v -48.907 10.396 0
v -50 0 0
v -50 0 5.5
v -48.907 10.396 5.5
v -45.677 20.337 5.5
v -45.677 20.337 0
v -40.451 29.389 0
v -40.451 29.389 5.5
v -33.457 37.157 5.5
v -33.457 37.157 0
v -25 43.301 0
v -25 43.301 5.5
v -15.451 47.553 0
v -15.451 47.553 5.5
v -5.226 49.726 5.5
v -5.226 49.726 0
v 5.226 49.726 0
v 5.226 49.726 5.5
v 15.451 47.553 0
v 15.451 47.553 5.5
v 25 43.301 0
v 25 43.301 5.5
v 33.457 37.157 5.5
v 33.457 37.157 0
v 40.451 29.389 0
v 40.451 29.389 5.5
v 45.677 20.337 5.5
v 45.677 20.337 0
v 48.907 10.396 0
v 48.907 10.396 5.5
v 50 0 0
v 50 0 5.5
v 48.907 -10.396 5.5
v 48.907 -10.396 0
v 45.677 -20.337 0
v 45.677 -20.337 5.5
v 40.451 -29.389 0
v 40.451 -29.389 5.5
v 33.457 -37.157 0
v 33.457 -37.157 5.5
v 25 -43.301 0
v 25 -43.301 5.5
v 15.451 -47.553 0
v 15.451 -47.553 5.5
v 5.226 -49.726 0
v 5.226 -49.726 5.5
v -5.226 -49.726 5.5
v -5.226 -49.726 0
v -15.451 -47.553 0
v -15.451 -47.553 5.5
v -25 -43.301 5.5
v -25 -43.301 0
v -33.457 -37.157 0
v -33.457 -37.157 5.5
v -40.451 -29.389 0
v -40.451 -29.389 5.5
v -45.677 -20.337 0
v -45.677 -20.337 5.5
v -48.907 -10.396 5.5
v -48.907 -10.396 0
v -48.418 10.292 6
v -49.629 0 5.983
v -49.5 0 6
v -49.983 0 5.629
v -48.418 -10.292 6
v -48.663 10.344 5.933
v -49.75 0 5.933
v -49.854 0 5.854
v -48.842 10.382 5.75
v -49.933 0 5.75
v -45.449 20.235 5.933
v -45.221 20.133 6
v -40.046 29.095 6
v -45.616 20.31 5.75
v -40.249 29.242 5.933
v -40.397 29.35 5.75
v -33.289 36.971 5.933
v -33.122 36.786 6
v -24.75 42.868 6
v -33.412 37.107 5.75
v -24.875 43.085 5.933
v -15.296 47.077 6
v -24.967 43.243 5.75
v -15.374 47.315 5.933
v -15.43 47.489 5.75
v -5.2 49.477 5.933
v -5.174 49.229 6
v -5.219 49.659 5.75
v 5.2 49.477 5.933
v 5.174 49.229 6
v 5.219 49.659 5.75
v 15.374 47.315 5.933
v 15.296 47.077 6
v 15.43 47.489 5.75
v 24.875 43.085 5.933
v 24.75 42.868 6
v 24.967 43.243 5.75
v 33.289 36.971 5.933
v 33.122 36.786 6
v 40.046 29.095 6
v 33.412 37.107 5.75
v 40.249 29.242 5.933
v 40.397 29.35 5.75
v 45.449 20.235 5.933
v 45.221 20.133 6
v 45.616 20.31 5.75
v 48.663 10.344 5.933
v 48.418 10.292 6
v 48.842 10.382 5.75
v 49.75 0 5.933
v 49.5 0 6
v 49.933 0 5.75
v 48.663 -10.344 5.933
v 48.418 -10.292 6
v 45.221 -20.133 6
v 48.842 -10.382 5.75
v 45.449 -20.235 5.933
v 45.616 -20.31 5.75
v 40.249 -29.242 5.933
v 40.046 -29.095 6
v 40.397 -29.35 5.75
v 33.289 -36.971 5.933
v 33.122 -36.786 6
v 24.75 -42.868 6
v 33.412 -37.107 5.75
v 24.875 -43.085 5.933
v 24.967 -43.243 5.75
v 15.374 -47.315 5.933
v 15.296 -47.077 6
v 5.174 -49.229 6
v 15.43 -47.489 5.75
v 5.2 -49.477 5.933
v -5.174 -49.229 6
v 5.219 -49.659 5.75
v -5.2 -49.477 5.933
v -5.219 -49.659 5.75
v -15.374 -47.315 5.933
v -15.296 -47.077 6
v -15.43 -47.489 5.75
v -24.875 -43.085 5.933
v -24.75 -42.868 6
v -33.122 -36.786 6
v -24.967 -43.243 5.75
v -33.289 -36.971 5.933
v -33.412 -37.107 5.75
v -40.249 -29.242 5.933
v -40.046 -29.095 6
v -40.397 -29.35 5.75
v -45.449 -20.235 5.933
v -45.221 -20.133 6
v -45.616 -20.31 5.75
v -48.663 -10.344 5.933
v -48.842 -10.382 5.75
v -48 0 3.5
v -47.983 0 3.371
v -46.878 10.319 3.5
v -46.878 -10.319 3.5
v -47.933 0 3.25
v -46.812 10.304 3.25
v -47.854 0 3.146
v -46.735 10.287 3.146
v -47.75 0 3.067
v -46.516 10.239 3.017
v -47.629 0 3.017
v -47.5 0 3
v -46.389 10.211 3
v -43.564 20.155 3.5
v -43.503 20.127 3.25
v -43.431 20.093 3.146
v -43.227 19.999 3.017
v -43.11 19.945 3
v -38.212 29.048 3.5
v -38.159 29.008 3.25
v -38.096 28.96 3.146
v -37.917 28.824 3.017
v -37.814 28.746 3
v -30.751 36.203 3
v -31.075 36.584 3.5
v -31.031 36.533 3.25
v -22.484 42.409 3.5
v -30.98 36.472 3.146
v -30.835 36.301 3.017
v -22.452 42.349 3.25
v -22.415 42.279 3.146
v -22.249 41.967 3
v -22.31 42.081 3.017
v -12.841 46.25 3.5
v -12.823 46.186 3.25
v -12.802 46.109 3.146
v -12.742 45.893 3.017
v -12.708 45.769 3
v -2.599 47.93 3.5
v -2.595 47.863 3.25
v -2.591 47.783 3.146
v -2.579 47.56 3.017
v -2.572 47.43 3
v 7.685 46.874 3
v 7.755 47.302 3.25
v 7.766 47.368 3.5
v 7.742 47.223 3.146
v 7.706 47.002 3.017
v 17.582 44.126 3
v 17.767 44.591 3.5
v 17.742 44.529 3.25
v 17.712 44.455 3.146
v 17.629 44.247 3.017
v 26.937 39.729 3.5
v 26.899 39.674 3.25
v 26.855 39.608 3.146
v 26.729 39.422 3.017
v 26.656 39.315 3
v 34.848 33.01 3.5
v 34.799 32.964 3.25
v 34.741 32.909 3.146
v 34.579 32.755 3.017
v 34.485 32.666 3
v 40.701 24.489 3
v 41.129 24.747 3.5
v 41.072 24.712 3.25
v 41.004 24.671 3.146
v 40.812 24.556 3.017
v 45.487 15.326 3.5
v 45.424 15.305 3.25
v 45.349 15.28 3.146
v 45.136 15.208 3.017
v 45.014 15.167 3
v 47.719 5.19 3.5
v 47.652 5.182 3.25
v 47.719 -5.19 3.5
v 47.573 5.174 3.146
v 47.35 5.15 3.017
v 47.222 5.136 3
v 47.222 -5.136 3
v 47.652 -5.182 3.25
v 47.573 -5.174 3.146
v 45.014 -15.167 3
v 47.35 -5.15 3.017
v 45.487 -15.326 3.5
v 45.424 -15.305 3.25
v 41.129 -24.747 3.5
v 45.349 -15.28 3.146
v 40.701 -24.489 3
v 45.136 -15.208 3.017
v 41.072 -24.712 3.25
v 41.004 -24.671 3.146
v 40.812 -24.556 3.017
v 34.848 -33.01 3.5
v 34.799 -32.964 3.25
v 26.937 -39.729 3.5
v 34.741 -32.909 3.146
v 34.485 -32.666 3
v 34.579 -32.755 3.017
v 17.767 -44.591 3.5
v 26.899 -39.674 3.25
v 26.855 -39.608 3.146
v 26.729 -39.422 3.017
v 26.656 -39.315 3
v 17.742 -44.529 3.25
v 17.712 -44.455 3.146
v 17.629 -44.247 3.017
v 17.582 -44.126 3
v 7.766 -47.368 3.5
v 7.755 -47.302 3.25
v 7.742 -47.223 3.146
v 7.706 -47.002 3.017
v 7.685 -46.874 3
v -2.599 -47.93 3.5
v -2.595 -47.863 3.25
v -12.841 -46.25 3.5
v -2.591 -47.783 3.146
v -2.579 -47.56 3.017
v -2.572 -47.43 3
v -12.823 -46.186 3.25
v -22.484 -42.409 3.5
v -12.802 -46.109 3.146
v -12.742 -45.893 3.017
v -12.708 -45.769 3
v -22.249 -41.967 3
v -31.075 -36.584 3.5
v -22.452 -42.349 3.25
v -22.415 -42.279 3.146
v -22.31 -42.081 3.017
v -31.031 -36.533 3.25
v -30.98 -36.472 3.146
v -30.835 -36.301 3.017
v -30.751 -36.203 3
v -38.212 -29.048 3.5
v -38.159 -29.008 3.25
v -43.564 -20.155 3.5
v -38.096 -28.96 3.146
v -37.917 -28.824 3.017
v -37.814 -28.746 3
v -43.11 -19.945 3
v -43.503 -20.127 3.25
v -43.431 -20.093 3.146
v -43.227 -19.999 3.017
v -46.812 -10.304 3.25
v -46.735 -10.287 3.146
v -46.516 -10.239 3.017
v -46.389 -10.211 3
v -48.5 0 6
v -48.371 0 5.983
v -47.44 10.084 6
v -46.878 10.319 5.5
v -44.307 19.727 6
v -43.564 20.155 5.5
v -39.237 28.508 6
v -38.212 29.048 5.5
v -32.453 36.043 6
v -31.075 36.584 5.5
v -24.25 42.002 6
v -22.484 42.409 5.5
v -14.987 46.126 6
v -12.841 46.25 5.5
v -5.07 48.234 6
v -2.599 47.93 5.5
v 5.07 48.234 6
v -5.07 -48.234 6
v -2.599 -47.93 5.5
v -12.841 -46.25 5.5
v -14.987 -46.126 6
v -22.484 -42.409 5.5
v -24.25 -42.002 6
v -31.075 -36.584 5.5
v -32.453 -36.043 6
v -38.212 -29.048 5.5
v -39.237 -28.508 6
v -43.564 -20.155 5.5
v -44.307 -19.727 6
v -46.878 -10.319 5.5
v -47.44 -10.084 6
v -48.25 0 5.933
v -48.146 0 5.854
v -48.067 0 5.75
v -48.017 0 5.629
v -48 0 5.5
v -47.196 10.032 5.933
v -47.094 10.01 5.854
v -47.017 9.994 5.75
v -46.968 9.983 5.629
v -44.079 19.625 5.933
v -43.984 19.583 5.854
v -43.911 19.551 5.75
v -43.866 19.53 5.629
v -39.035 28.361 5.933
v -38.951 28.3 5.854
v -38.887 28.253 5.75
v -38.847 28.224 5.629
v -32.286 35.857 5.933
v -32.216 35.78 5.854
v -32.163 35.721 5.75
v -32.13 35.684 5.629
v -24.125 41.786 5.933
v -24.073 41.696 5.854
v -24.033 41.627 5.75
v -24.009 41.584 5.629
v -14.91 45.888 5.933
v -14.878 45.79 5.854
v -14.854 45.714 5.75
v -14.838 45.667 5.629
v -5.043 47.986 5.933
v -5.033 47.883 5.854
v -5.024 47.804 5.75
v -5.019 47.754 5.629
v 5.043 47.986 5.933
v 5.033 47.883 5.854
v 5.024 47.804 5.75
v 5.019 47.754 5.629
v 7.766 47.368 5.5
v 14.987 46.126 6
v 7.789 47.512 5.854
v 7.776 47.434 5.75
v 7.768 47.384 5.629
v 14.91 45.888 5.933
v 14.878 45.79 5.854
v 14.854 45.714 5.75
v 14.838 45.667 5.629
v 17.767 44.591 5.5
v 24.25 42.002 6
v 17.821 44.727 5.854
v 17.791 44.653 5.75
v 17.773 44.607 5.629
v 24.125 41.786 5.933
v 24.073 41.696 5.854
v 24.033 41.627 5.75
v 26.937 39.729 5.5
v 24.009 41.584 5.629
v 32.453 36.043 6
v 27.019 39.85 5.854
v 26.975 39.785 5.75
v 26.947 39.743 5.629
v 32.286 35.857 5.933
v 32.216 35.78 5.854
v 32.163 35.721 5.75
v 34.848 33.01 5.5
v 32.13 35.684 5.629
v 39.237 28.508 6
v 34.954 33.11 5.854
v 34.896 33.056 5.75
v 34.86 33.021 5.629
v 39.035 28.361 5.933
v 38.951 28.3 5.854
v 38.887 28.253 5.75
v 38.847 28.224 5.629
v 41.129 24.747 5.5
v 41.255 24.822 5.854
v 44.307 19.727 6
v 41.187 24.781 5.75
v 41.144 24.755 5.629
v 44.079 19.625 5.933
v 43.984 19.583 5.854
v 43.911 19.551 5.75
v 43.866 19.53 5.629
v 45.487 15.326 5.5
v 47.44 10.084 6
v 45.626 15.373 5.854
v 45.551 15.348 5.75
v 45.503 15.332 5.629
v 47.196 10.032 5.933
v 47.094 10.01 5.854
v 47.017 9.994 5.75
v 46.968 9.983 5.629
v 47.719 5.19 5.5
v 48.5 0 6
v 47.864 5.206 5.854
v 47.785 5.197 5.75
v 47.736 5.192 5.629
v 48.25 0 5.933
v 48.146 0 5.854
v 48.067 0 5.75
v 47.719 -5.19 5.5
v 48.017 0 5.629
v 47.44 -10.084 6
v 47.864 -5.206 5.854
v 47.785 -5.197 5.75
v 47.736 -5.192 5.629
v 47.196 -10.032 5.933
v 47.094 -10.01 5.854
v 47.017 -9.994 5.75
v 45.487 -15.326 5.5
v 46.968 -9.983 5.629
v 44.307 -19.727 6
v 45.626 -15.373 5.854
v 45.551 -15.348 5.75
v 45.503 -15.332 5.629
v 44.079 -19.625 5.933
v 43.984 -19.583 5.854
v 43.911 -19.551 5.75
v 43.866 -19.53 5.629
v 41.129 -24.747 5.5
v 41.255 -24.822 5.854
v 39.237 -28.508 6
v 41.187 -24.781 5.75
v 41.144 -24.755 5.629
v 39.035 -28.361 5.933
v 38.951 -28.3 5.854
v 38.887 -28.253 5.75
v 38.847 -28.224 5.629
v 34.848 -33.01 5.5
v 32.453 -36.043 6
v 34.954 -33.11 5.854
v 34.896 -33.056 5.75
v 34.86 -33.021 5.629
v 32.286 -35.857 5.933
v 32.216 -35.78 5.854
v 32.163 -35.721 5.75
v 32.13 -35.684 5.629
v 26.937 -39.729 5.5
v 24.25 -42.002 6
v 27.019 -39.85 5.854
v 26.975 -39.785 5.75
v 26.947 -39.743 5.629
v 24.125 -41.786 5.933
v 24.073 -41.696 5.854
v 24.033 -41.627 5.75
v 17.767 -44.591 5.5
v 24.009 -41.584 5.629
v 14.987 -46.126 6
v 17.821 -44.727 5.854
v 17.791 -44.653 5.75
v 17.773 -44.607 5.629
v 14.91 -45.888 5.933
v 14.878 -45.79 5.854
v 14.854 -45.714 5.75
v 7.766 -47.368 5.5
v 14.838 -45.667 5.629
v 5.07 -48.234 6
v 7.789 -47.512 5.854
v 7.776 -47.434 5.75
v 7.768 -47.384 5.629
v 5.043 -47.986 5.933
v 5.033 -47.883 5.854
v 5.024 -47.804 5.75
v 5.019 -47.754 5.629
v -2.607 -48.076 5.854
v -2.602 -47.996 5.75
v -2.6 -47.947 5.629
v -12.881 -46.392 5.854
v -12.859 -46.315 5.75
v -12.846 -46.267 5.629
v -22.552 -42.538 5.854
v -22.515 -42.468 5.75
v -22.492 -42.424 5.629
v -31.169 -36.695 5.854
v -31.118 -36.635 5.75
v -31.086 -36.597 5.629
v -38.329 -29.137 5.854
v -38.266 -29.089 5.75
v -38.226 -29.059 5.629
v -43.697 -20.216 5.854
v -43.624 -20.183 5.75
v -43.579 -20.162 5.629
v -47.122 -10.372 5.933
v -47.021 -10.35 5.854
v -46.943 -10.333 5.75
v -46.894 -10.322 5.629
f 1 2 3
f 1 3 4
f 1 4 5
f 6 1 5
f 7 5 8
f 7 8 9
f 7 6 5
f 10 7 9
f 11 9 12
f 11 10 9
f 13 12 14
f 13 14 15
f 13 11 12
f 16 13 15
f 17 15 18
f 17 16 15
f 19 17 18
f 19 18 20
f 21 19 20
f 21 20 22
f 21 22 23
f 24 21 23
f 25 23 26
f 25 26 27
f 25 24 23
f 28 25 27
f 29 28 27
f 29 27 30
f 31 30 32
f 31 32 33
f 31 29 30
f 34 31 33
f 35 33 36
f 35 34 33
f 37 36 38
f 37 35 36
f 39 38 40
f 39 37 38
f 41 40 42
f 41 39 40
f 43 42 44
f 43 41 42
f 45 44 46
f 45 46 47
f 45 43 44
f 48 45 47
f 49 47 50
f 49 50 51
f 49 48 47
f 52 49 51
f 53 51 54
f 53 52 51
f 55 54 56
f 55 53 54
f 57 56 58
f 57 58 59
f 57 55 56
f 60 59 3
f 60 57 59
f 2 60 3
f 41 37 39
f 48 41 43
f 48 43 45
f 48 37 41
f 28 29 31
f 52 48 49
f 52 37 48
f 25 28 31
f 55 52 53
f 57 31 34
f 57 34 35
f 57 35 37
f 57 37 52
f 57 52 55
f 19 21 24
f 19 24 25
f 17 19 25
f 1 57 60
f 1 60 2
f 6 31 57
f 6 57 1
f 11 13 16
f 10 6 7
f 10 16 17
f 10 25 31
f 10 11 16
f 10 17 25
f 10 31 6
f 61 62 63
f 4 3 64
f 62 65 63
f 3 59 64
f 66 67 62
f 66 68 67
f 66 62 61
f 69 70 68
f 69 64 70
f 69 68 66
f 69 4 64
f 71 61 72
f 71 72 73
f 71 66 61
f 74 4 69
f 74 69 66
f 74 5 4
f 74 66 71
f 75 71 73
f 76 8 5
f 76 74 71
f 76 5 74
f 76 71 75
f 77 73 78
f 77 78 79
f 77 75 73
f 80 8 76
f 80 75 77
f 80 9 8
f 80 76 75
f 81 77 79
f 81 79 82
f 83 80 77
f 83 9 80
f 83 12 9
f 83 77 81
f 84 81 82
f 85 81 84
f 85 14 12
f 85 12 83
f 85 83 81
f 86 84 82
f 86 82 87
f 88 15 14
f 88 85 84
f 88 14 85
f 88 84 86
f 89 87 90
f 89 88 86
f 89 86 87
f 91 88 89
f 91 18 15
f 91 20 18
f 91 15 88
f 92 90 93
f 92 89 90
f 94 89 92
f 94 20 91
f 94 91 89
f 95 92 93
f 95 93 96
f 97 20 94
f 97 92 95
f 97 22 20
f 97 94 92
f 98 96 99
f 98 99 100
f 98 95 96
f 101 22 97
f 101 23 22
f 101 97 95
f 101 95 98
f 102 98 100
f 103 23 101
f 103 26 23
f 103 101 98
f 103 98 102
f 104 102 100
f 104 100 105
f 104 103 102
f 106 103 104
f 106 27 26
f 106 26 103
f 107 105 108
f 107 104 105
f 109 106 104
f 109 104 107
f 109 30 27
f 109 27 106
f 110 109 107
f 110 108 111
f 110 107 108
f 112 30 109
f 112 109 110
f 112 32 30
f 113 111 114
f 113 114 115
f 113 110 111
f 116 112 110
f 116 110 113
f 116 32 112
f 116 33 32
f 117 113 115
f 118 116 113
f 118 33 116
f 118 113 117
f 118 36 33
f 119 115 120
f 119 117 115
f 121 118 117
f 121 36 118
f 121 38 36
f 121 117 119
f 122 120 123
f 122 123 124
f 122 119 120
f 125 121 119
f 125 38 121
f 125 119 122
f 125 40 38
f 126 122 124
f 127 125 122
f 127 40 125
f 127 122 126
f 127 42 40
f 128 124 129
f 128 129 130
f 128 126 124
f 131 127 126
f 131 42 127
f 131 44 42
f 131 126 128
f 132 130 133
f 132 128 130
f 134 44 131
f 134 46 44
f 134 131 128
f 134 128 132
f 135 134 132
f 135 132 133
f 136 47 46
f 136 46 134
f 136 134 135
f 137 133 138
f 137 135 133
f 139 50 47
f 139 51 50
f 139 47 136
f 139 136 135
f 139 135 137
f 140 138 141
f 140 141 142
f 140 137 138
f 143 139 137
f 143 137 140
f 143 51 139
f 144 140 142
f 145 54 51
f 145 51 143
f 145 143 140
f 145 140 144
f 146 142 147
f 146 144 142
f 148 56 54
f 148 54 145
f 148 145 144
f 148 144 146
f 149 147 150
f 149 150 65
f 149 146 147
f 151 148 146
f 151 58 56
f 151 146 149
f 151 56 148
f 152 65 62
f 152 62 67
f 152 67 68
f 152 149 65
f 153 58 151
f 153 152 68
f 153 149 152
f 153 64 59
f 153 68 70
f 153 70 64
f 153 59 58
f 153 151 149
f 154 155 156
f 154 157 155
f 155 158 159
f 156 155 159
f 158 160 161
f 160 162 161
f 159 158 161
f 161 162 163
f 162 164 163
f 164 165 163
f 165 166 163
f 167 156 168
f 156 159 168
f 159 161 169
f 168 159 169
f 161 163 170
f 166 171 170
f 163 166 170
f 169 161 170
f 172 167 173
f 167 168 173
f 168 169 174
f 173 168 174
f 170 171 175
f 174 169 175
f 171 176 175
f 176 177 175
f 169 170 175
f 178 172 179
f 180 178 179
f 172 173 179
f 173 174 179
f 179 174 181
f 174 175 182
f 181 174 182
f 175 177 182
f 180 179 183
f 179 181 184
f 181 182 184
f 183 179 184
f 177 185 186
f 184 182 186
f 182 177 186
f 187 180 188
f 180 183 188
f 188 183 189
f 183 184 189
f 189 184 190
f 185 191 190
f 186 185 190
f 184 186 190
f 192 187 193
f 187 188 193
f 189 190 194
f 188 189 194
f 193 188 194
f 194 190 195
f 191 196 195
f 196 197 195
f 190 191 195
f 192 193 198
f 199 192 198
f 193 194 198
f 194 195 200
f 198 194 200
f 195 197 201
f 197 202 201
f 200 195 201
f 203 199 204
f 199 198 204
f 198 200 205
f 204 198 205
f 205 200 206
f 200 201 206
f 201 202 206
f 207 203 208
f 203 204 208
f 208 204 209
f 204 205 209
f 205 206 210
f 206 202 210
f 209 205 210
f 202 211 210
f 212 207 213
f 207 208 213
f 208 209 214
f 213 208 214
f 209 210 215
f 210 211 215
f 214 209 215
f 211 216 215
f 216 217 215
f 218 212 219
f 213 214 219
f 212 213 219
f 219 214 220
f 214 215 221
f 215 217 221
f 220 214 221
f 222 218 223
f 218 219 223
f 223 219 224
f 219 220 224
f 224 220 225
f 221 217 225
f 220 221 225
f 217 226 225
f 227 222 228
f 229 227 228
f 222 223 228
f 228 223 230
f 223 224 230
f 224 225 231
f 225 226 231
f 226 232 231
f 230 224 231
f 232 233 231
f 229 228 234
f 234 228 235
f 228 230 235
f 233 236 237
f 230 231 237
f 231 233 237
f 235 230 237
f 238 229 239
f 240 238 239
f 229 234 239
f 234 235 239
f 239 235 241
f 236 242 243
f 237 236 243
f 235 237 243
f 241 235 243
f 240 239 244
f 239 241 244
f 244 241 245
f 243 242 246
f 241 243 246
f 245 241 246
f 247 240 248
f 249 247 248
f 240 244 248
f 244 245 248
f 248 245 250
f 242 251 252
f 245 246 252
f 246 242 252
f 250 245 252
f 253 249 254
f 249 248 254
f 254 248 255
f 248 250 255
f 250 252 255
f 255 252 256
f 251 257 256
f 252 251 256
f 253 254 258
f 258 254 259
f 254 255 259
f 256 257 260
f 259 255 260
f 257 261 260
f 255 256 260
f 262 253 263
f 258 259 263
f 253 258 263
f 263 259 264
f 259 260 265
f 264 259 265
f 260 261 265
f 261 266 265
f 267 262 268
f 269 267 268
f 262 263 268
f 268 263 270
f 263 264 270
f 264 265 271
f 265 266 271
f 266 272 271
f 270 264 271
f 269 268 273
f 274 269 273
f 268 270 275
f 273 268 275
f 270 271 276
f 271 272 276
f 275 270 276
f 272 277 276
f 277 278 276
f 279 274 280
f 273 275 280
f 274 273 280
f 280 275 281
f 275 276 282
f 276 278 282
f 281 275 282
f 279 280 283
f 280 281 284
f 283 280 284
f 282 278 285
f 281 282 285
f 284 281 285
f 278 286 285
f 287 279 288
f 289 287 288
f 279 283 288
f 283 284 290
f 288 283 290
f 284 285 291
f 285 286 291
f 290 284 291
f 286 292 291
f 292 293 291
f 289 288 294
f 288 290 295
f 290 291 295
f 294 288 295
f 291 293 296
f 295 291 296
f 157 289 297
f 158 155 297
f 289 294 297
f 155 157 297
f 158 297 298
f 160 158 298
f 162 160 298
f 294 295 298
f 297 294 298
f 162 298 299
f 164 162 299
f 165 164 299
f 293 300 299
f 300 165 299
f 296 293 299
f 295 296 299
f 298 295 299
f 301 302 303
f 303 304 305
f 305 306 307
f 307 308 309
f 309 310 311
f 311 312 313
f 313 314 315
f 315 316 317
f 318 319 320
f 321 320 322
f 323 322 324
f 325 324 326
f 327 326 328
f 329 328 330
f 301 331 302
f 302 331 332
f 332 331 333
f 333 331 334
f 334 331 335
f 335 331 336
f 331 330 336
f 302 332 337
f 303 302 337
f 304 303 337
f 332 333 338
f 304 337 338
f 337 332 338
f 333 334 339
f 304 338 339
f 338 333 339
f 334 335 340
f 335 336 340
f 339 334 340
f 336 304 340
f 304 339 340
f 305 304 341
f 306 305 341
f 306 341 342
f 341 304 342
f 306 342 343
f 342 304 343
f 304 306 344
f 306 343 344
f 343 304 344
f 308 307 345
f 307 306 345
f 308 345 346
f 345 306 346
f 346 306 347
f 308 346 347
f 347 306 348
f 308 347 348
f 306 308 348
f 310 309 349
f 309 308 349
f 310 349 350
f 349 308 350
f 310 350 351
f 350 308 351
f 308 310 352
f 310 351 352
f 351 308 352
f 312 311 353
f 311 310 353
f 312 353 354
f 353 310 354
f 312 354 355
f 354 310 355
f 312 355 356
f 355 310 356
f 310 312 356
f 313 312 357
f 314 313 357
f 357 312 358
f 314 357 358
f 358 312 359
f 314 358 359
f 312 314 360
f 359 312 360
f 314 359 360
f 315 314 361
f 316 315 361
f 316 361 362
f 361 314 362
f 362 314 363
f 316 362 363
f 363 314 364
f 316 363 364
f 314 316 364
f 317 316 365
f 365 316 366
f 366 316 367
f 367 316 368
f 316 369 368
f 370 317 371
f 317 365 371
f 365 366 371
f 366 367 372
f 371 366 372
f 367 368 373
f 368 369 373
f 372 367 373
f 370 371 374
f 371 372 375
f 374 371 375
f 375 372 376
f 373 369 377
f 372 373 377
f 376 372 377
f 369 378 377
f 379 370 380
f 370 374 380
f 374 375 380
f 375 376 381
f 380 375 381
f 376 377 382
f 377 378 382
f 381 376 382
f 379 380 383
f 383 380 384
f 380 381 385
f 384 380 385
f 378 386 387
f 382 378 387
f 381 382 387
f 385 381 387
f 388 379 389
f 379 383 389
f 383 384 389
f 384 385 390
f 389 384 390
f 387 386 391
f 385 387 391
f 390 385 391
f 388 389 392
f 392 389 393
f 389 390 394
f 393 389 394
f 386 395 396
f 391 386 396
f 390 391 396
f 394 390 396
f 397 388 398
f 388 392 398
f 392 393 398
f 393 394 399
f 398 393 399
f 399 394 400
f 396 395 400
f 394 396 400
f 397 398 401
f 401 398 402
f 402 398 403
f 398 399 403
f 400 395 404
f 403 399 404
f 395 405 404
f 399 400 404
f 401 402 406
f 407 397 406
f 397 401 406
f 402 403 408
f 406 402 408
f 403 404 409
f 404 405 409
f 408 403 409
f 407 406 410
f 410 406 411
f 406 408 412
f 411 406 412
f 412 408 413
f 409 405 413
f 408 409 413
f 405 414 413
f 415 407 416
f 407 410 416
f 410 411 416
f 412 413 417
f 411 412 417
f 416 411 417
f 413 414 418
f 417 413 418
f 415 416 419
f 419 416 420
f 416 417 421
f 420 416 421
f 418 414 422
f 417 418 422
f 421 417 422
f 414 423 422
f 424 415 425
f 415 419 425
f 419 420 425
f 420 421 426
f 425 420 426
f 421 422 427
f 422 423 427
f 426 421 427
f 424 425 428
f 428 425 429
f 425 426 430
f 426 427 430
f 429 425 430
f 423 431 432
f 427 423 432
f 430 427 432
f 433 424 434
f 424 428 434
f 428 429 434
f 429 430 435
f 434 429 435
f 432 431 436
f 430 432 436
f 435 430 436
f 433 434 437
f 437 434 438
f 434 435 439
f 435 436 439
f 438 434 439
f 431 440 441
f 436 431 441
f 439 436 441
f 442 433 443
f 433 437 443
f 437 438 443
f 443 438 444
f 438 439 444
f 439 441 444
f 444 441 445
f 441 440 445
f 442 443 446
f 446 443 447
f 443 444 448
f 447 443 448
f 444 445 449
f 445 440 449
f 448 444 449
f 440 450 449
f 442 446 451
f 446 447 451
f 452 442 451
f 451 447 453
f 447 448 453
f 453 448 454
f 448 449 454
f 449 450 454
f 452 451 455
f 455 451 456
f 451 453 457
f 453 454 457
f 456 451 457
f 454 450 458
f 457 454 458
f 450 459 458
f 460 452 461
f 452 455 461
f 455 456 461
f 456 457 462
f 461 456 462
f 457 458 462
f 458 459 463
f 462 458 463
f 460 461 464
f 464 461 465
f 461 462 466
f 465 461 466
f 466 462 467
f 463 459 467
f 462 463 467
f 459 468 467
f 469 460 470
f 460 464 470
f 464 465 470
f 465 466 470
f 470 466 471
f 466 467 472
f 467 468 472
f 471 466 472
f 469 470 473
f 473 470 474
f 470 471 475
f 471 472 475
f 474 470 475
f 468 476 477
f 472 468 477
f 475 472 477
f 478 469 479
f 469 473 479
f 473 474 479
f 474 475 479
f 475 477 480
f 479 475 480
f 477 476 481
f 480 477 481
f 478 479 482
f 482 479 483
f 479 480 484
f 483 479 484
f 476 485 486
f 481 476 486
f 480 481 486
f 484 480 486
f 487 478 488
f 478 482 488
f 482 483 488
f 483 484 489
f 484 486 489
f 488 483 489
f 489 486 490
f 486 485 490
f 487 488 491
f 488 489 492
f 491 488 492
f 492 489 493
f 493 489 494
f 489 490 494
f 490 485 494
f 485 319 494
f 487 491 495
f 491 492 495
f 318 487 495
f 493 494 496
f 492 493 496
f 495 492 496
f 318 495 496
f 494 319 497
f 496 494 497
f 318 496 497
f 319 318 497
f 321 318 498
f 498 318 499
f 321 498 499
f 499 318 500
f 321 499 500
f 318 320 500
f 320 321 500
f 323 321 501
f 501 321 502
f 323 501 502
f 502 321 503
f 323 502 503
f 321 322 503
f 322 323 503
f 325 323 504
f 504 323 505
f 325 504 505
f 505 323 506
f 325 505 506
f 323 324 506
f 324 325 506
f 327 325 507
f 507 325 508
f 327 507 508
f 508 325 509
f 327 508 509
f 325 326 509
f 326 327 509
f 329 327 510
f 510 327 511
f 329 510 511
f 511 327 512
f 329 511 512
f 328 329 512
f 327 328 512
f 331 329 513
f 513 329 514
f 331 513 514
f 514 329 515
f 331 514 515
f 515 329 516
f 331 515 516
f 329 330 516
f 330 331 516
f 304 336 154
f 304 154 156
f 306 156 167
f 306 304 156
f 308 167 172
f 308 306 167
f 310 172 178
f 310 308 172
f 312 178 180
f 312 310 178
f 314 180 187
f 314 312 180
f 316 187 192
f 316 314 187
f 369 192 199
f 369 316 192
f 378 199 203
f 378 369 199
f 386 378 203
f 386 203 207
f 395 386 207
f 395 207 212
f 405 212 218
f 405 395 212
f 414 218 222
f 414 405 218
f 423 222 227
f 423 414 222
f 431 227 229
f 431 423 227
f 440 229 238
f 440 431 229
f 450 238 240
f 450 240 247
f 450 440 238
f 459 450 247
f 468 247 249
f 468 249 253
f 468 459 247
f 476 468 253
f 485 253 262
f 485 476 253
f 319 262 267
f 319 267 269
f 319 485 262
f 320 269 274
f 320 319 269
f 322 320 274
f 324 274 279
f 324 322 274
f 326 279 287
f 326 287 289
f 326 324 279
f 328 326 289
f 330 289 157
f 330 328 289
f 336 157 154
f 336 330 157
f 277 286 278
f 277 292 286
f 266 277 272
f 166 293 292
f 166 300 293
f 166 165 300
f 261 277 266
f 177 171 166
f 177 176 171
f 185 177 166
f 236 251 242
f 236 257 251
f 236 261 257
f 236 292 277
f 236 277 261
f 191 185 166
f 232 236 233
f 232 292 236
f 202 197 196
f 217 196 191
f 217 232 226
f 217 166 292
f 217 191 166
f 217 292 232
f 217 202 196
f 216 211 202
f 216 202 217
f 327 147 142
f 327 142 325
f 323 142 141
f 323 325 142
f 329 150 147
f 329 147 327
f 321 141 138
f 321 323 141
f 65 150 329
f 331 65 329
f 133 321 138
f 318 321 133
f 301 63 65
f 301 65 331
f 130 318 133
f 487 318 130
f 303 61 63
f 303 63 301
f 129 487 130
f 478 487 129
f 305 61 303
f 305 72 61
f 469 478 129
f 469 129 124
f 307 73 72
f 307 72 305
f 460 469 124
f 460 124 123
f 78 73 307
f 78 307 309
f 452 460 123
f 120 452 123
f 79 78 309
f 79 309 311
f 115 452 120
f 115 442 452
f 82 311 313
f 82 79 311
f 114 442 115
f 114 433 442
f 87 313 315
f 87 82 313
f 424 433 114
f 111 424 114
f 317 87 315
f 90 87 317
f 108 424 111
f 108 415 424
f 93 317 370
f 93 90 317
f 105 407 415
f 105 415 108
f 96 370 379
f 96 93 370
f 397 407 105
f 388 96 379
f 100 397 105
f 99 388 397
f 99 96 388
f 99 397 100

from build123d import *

# Parameters (mm, degrees)
F2_R = 0.5
F3_R = 0.5
F4_R = 0.5


with BuildPart() as f1:
    # F0 (on Front) → F1 (revolve)
    with BuildSketch(Plane.XZ):
        Polygon((-50, 0), (0, 0), (0, 3), (-48, 3), (-48, 6), (-50, 6), align=None)
    revolve(axis=Axis((0, 0, 1.5), (0, 0, -1)))

    # F2
    f2_edges = [f1.edges().sort_by_distance(p)[0] for p in [
        (50, 0, 6),
    ]]
    fillet(f2_edges, radius=F2_R)

    # F3
    f3_edges = [f1.edges().sort_by_distance(p)[0] for p in [
        (48, 0, 6),
    ]]
    fillet(f3_edges, radius=F3_R)

    # F4
    f4_edges = [f1.edges().sort_by_distance(p)[0] for p in [
        (48, 0, 3),
    ]]
    fillet(f4_edges, radius=F4_R)


solid = f1.part
